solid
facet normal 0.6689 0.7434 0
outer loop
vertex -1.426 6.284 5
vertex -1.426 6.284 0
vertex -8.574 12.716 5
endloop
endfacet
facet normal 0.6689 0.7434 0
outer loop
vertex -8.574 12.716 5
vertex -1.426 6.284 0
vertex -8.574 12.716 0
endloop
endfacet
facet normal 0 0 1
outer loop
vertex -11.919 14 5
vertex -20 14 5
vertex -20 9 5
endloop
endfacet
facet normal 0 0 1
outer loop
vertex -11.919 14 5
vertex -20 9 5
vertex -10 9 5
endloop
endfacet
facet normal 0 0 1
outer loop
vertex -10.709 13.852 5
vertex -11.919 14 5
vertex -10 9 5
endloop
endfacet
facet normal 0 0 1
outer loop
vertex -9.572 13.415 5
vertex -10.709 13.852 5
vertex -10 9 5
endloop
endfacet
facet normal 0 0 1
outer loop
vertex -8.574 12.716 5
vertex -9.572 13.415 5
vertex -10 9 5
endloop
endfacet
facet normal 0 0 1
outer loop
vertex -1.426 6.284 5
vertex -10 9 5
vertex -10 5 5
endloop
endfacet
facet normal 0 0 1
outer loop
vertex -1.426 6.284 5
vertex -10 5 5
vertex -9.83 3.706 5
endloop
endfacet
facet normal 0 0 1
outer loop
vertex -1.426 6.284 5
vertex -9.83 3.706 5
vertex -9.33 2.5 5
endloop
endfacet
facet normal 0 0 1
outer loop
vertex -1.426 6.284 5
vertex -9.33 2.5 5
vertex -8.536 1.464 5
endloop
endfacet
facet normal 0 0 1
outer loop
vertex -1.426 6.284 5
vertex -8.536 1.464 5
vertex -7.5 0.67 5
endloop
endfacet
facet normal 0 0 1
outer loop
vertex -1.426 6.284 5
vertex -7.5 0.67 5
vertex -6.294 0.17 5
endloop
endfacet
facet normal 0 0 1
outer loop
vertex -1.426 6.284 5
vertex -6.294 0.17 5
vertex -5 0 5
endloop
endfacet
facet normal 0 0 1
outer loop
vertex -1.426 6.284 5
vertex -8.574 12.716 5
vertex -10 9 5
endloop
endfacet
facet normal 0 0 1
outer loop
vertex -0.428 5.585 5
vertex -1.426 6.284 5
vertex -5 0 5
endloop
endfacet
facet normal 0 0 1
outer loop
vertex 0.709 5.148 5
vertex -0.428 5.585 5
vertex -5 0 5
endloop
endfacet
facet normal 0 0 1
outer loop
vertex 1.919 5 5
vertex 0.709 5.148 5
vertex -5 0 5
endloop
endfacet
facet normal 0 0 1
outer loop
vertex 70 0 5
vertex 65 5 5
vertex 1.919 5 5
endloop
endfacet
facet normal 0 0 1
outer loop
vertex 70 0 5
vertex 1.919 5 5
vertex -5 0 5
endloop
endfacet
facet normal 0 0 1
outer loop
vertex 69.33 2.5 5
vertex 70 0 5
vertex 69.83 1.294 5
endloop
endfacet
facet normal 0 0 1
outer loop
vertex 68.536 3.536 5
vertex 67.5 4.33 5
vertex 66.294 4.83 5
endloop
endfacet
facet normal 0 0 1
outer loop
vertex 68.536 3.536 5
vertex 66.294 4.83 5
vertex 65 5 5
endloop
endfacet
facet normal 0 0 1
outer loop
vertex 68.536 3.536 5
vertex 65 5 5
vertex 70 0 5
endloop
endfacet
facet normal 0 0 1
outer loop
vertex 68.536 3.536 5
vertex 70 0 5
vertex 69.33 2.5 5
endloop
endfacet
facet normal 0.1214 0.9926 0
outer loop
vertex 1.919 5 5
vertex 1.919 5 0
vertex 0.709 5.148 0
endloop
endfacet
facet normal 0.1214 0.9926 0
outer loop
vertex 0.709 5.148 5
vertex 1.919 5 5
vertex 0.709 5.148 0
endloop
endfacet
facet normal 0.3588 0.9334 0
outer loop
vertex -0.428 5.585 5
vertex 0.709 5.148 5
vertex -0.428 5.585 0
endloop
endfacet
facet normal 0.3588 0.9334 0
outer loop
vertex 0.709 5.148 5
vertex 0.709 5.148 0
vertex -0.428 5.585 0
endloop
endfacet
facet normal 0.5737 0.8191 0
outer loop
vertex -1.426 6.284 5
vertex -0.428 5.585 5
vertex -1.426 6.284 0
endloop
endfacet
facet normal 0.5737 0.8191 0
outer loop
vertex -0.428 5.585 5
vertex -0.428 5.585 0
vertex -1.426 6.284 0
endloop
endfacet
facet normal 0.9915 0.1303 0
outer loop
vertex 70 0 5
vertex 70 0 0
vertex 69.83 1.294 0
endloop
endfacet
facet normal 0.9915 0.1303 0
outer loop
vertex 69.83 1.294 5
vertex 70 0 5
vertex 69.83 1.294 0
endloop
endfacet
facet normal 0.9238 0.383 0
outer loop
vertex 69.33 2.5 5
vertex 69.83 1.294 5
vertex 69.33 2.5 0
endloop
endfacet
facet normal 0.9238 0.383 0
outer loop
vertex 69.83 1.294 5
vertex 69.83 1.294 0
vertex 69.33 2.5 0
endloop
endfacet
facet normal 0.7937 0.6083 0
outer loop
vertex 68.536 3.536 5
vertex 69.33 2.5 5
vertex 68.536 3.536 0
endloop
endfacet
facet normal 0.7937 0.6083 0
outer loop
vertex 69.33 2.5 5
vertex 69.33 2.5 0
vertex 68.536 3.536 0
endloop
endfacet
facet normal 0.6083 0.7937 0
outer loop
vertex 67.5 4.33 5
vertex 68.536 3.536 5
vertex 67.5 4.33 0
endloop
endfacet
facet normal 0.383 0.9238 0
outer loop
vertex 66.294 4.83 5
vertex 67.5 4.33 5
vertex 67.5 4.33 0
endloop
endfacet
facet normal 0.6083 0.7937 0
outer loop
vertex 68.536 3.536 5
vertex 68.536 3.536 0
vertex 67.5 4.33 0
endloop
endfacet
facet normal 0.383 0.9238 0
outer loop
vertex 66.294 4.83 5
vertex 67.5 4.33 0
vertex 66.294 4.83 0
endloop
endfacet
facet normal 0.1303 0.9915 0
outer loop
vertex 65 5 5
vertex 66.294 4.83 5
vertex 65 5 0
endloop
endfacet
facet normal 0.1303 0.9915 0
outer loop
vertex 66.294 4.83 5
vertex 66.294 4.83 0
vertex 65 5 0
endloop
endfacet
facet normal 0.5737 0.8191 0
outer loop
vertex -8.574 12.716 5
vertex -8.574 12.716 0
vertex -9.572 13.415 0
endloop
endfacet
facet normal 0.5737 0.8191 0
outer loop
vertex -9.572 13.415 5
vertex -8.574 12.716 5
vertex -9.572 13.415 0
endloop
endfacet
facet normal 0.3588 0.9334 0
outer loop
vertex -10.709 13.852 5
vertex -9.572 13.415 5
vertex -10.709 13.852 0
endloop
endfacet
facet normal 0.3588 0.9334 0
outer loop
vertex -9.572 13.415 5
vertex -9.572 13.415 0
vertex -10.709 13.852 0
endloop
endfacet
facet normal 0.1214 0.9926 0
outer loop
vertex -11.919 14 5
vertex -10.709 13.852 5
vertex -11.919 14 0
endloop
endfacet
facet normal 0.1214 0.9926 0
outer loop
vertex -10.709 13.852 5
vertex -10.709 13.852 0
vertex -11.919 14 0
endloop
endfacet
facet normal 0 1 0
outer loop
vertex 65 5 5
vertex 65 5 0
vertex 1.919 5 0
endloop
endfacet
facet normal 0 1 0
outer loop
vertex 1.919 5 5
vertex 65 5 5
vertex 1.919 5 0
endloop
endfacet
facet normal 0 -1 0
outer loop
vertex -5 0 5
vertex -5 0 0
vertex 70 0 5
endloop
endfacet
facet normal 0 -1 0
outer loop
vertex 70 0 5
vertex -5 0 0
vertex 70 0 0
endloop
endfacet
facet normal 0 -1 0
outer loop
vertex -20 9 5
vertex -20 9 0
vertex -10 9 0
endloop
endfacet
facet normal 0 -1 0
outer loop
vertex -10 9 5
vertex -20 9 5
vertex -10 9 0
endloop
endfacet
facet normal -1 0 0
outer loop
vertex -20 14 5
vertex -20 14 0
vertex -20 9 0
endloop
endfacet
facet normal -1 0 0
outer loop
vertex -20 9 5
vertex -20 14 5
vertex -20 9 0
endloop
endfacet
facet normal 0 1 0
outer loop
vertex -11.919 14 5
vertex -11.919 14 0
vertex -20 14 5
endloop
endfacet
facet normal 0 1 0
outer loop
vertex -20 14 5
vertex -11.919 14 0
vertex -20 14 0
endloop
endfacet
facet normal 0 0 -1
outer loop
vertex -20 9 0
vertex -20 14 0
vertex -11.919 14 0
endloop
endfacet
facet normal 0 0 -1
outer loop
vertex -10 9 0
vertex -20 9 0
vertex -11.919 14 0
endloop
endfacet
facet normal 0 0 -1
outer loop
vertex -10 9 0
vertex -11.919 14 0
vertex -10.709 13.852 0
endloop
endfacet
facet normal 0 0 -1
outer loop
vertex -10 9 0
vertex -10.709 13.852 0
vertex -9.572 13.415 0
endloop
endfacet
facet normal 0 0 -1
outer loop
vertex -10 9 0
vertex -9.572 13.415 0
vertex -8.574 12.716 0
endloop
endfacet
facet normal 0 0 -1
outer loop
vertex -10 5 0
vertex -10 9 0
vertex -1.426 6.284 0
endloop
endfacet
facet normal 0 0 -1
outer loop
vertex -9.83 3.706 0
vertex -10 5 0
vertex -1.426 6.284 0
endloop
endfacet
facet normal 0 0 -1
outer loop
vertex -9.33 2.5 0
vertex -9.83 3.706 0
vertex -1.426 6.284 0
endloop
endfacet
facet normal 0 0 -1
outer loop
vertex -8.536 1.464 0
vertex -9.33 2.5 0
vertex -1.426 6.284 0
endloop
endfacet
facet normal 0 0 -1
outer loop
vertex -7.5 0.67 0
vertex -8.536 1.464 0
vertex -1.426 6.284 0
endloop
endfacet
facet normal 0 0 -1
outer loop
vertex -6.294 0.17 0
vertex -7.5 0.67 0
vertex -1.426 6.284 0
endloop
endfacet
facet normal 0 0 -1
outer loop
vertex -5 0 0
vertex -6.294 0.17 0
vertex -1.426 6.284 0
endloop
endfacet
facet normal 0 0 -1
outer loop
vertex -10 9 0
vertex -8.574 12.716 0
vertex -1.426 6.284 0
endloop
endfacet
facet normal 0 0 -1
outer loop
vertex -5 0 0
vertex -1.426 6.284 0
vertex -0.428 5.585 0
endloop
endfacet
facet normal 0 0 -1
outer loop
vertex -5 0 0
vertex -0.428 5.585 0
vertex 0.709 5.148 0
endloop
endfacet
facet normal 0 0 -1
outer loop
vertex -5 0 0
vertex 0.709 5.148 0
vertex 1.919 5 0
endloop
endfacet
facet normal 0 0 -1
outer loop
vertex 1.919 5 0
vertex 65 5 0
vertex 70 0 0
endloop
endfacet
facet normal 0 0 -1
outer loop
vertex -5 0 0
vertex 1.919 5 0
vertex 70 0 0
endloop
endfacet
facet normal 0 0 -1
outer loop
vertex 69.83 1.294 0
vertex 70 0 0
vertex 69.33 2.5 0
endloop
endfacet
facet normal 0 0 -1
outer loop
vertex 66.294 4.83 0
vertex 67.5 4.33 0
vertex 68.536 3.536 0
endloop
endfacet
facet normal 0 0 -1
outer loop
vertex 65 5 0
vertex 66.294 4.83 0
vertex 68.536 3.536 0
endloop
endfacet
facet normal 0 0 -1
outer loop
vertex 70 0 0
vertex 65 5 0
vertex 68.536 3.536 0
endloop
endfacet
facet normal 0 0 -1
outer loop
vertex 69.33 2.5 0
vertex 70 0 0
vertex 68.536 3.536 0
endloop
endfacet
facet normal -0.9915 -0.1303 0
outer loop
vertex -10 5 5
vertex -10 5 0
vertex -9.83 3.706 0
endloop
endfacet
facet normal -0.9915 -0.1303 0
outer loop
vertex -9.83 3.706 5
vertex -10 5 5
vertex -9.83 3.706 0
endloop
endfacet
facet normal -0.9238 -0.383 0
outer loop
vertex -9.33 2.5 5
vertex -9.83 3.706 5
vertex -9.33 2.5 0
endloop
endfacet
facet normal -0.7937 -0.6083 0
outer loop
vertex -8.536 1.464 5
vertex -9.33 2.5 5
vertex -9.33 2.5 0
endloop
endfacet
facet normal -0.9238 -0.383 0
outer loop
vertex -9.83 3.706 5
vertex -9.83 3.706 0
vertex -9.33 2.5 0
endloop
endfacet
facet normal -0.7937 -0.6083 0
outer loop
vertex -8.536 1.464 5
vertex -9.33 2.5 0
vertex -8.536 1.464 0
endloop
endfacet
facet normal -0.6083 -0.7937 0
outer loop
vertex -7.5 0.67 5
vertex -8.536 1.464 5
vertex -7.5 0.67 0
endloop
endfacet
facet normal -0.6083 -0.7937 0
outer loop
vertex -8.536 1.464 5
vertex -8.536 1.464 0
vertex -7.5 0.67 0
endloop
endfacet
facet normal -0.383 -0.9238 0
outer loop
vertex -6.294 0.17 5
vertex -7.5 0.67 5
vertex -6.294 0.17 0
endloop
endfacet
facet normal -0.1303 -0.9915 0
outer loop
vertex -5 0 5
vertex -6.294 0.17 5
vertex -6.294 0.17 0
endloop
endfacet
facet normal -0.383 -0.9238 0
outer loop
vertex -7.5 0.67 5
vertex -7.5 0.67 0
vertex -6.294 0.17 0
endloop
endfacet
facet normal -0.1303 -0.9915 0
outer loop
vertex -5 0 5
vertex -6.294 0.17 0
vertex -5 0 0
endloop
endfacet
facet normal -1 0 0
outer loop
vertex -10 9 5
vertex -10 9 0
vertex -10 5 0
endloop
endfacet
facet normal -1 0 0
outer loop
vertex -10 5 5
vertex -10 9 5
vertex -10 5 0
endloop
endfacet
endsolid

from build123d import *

# Parameters (mm, degrees)
F1_DEPTH = 5


with BuildPart() as f1:
    # F0 (on Top) → F1 (new body)
    with BuildSketch(Plane.XY):
        with BuildLine():
            Line((-11.91868, 14), (-20, 14))
            Line((-20, 14), (-20, 9))
            Line((-20, 9), (-10, 9))
            Line((-10, 9), (-10, 5))
            ThreePointArc((-10, 5), (-8.535534, 1.464466), (-5, 0))
            Line((-5, 0), (0, 0))
            Line((0, 0), (70, 0))
            ThreePointArc((70, 0), (68.535534, 3.535534), (65, 5))
            Line((65, 5), (1.91868, 5))
            ThreePointArc((1.91868, 5), (0.127361, 5.331898), (-1.426144, 6.283529))
            Line((-1.426144, 6.283529), (-8.573856, 12.716471))
            ThreePointArc((-8.573856, 12.716471), (-10.127361, 13.668102), (-11.91868, 14))
        make_face()
    extrude(amount=F1_DEPTH)


solid = f1.part
